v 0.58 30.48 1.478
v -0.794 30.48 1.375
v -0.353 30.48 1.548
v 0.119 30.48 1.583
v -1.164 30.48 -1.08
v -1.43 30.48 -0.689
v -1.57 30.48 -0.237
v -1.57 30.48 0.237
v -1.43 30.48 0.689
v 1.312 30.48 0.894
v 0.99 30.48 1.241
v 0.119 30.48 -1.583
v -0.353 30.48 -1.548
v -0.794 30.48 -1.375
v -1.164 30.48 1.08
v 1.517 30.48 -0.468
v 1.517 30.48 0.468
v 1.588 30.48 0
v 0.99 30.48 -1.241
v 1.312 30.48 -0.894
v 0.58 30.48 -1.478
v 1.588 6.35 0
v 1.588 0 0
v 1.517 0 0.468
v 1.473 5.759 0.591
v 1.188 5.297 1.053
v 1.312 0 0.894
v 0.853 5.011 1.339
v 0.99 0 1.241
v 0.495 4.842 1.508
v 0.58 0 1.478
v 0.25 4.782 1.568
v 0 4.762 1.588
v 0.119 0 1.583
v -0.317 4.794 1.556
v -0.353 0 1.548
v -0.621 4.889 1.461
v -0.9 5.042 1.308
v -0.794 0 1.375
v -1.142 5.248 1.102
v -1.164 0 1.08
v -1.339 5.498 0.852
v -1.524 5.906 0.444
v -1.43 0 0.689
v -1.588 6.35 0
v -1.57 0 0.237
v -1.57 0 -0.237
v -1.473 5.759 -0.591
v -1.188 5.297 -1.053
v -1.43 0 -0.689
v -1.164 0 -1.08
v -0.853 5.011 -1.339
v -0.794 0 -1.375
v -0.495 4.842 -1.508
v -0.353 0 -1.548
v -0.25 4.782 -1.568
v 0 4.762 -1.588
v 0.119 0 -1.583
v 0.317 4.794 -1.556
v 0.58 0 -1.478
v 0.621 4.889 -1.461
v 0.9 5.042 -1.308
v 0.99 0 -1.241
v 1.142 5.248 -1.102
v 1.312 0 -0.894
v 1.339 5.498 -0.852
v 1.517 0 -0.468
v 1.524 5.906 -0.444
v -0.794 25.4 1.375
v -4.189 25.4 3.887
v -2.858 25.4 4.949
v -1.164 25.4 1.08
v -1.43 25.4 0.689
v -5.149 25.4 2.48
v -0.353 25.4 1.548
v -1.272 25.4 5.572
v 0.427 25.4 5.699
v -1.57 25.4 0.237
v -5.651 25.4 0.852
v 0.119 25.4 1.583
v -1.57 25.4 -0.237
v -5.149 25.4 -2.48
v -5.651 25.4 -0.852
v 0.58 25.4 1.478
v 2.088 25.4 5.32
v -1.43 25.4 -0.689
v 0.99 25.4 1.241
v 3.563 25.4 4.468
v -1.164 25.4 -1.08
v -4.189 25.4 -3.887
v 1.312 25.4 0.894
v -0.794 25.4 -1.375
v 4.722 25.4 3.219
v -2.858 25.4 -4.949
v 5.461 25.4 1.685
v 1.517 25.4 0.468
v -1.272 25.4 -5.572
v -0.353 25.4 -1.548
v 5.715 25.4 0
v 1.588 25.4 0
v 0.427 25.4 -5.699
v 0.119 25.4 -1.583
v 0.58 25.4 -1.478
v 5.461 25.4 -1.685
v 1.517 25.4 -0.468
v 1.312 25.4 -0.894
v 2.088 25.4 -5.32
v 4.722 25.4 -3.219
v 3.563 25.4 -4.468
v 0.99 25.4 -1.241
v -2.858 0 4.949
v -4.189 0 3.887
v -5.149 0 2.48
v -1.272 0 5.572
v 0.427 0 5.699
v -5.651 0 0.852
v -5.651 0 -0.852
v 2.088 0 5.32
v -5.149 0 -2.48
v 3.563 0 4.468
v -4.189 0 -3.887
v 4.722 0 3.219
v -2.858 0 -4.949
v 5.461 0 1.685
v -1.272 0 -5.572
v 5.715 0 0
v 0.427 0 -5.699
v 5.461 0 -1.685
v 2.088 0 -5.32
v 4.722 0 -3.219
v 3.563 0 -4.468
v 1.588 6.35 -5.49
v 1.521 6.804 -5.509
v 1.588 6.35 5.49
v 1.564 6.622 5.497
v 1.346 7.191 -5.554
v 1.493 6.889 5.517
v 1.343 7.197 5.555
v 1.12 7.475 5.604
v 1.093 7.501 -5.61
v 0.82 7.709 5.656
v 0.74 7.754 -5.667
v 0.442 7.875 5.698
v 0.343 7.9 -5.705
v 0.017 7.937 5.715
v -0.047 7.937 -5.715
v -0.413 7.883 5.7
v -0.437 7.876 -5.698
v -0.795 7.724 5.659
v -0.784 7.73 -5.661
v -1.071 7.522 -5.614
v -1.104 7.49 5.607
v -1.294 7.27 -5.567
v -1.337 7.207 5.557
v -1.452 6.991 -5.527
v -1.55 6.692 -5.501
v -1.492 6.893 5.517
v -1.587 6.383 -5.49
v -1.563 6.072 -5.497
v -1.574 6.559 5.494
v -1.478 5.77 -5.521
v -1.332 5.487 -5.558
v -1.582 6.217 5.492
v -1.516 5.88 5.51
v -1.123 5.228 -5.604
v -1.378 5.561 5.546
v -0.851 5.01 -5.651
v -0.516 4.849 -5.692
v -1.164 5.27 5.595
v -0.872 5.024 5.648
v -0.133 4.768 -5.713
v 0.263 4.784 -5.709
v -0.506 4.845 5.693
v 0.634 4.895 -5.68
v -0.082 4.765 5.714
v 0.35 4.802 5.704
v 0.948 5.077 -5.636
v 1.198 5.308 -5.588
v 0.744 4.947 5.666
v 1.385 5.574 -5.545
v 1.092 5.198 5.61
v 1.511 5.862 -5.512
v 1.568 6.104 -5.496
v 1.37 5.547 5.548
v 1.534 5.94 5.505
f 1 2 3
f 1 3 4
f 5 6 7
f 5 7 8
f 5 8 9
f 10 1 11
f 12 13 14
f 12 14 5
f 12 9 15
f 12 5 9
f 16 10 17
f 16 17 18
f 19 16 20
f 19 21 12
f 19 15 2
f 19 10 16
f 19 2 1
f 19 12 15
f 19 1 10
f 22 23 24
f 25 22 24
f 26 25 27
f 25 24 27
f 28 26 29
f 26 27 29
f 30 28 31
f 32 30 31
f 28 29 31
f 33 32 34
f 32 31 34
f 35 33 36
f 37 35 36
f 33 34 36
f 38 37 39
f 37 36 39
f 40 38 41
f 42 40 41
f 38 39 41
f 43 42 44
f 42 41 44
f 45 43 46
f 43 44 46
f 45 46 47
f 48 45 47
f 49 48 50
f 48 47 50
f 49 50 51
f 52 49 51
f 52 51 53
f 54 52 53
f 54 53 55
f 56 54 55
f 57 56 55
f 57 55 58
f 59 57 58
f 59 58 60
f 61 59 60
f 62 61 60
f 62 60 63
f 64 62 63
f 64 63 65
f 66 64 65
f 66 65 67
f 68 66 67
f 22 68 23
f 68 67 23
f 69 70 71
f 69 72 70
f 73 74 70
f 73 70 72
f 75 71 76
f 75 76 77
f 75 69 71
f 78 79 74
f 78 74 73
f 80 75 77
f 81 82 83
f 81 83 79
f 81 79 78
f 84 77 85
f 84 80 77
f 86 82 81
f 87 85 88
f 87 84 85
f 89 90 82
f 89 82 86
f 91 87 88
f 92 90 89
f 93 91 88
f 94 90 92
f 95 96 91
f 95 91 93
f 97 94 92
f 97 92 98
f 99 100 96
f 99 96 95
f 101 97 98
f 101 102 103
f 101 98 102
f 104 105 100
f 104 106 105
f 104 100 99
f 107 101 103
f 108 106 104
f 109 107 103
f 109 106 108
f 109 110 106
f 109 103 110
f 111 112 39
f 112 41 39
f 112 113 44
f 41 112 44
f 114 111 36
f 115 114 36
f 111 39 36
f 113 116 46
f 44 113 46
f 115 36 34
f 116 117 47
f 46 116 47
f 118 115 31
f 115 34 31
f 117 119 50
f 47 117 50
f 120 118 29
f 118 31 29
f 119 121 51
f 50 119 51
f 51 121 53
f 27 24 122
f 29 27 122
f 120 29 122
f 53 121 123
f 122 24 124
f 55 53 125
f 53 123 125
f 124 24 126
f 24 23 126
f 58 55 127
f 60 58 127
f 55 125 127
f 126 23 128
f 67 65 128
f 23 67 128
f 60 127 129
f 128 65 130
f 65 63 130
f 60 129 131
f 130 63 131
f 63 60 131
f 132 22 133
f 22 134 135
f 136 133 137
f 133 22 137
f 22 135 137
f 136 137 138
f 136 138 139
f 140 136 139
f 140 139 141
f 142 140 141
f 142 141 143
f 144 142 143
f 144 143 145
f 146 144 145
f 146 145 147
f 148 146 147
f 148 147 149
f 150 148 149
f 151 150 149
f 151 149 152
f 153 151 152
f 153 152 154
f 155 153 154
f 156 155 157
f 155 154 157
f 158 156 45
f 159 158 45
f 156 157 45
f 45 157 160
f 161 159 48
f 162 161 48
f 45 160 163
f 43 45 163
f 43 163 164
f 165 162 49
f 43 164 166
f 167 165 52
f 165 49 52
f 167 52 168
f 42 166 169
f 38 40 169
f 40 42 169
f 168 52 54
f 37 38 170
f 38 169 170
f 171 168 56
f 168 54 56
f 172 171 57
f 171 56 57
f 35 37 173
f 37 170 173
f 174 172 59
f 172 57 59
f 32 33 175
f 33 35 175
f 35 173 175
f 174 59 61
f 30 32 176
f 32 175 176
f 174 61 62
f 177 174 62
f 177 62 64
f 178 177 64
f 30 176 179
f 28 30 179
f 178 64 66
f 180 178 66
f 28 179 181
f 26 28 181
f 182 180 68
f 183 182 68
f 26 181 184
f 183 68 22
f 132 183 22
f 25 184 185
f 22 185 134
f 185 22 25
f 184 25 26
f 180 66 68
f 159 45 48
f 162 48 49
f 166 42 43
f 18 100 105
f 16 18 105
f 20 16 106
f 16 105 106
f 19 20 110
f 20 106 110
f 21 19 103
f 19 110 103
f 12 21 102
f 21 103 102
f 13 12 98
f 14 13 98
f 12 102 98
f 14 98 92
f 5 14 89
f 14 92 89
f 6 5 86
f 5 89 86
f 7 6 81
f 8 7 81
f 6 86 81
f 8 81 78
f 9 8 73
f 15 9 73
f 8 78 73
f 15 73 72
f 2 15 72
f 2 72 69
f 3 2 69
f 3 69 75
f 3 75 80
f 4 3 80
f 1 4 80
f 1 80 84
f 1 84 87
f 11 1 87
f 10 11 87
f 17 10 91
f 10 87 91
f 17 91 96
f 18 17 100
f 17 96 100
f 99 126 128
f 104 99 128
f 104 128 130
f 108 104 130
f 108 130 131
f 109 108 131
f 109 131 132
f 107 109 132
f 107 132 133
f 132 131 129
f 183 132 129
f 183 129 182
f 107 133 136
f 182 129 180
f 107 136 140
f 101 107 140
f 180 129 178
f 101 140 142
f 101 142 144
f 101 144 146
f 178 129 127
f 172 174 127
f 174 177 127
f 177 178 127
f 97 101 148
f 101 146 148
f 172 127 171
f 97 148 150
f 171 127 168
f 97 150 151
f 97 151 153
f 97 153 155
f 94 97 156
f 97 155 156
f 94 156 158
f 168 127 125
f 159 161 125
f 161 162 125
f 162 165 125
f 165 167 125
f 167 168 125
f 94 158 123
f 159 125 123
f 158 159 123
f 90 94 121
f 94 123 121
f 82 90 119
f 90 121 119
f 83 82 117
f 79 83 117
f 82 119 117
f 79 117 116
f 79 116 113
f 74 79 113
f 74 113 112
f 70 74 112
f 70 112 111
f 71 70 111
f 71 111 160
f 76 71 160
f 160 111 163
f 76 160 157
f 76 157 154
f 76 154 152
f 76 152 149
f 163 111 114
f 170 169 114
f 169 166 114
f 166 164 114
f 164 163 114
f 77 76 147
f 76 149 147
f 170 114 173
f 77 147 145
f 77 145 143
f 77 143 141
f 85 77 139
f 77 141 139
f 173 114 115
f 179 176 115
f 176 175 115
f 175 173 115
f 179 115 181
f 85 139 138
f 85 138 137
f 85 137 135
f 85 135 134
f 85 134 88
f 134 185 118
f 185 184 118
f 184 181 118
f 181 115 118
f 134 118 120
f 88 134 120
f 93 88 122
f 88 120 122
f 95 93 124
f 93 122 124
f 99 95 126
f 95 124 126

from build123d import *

# Parameters (mm, degrees)
SKETCH1_R           = 5.715
BOSS_EXTRUDE1_DEPTH = 25.4
SKETCH2_R           = 1.5875
BOSS_EXTRUDE2_DEPTH = 5.08
SKETCH4_R           = 1.5875
CUT_EXTRUDE2_DEPTH  = 6.35
SKETCH3_R           = 1.5875
CUT_EXTRUDE3_DEPTH  = 12.43


with BuildPart() as part:
    # Sketch1 → Boss-Extrude1 (new body)
    with BuildSketch(Plane(origin=(0, 0, 0), x_dir=(1, 0, 0), z_dir=(0, 1, 0))):
        Circle(SKETCH1_R)
    extrude(amount=BOSS_EXTRUDE1_DEPTH)

    # Sketch2 → Boss-Extrude2 (add)
    with BuildSketch(Plane(origin=(0, 25.4, 0), x_dir=(1, 0, 0), z_dir=(0, 1, 0))):
        Circle(SKETCH2_R)
    extrude(amount=BOSS_EXTRUDE2_DEPTH)

    # Sketch4 → Cut-Extrude2 (cut)
    with BuildSketch(Plane.XZ):
        Circle(SKETCH4_R)
    extrude(amount=-CUT_EXTRUDE2_DEPTH, mode=Mode.SUBTRACT)

    # Sketch3 → Cut-Extrude3 (cut, through all)
    with BuildSketch(Plane.XY.offset(5.715)):
        with Locations((0, 6.35)):
            Circle(SKETCH3_R)
    extrude(amount=-CUT_EXTRUDE3_DEPTH, mode=Mode.SUBTRACT)


solid = part.part
